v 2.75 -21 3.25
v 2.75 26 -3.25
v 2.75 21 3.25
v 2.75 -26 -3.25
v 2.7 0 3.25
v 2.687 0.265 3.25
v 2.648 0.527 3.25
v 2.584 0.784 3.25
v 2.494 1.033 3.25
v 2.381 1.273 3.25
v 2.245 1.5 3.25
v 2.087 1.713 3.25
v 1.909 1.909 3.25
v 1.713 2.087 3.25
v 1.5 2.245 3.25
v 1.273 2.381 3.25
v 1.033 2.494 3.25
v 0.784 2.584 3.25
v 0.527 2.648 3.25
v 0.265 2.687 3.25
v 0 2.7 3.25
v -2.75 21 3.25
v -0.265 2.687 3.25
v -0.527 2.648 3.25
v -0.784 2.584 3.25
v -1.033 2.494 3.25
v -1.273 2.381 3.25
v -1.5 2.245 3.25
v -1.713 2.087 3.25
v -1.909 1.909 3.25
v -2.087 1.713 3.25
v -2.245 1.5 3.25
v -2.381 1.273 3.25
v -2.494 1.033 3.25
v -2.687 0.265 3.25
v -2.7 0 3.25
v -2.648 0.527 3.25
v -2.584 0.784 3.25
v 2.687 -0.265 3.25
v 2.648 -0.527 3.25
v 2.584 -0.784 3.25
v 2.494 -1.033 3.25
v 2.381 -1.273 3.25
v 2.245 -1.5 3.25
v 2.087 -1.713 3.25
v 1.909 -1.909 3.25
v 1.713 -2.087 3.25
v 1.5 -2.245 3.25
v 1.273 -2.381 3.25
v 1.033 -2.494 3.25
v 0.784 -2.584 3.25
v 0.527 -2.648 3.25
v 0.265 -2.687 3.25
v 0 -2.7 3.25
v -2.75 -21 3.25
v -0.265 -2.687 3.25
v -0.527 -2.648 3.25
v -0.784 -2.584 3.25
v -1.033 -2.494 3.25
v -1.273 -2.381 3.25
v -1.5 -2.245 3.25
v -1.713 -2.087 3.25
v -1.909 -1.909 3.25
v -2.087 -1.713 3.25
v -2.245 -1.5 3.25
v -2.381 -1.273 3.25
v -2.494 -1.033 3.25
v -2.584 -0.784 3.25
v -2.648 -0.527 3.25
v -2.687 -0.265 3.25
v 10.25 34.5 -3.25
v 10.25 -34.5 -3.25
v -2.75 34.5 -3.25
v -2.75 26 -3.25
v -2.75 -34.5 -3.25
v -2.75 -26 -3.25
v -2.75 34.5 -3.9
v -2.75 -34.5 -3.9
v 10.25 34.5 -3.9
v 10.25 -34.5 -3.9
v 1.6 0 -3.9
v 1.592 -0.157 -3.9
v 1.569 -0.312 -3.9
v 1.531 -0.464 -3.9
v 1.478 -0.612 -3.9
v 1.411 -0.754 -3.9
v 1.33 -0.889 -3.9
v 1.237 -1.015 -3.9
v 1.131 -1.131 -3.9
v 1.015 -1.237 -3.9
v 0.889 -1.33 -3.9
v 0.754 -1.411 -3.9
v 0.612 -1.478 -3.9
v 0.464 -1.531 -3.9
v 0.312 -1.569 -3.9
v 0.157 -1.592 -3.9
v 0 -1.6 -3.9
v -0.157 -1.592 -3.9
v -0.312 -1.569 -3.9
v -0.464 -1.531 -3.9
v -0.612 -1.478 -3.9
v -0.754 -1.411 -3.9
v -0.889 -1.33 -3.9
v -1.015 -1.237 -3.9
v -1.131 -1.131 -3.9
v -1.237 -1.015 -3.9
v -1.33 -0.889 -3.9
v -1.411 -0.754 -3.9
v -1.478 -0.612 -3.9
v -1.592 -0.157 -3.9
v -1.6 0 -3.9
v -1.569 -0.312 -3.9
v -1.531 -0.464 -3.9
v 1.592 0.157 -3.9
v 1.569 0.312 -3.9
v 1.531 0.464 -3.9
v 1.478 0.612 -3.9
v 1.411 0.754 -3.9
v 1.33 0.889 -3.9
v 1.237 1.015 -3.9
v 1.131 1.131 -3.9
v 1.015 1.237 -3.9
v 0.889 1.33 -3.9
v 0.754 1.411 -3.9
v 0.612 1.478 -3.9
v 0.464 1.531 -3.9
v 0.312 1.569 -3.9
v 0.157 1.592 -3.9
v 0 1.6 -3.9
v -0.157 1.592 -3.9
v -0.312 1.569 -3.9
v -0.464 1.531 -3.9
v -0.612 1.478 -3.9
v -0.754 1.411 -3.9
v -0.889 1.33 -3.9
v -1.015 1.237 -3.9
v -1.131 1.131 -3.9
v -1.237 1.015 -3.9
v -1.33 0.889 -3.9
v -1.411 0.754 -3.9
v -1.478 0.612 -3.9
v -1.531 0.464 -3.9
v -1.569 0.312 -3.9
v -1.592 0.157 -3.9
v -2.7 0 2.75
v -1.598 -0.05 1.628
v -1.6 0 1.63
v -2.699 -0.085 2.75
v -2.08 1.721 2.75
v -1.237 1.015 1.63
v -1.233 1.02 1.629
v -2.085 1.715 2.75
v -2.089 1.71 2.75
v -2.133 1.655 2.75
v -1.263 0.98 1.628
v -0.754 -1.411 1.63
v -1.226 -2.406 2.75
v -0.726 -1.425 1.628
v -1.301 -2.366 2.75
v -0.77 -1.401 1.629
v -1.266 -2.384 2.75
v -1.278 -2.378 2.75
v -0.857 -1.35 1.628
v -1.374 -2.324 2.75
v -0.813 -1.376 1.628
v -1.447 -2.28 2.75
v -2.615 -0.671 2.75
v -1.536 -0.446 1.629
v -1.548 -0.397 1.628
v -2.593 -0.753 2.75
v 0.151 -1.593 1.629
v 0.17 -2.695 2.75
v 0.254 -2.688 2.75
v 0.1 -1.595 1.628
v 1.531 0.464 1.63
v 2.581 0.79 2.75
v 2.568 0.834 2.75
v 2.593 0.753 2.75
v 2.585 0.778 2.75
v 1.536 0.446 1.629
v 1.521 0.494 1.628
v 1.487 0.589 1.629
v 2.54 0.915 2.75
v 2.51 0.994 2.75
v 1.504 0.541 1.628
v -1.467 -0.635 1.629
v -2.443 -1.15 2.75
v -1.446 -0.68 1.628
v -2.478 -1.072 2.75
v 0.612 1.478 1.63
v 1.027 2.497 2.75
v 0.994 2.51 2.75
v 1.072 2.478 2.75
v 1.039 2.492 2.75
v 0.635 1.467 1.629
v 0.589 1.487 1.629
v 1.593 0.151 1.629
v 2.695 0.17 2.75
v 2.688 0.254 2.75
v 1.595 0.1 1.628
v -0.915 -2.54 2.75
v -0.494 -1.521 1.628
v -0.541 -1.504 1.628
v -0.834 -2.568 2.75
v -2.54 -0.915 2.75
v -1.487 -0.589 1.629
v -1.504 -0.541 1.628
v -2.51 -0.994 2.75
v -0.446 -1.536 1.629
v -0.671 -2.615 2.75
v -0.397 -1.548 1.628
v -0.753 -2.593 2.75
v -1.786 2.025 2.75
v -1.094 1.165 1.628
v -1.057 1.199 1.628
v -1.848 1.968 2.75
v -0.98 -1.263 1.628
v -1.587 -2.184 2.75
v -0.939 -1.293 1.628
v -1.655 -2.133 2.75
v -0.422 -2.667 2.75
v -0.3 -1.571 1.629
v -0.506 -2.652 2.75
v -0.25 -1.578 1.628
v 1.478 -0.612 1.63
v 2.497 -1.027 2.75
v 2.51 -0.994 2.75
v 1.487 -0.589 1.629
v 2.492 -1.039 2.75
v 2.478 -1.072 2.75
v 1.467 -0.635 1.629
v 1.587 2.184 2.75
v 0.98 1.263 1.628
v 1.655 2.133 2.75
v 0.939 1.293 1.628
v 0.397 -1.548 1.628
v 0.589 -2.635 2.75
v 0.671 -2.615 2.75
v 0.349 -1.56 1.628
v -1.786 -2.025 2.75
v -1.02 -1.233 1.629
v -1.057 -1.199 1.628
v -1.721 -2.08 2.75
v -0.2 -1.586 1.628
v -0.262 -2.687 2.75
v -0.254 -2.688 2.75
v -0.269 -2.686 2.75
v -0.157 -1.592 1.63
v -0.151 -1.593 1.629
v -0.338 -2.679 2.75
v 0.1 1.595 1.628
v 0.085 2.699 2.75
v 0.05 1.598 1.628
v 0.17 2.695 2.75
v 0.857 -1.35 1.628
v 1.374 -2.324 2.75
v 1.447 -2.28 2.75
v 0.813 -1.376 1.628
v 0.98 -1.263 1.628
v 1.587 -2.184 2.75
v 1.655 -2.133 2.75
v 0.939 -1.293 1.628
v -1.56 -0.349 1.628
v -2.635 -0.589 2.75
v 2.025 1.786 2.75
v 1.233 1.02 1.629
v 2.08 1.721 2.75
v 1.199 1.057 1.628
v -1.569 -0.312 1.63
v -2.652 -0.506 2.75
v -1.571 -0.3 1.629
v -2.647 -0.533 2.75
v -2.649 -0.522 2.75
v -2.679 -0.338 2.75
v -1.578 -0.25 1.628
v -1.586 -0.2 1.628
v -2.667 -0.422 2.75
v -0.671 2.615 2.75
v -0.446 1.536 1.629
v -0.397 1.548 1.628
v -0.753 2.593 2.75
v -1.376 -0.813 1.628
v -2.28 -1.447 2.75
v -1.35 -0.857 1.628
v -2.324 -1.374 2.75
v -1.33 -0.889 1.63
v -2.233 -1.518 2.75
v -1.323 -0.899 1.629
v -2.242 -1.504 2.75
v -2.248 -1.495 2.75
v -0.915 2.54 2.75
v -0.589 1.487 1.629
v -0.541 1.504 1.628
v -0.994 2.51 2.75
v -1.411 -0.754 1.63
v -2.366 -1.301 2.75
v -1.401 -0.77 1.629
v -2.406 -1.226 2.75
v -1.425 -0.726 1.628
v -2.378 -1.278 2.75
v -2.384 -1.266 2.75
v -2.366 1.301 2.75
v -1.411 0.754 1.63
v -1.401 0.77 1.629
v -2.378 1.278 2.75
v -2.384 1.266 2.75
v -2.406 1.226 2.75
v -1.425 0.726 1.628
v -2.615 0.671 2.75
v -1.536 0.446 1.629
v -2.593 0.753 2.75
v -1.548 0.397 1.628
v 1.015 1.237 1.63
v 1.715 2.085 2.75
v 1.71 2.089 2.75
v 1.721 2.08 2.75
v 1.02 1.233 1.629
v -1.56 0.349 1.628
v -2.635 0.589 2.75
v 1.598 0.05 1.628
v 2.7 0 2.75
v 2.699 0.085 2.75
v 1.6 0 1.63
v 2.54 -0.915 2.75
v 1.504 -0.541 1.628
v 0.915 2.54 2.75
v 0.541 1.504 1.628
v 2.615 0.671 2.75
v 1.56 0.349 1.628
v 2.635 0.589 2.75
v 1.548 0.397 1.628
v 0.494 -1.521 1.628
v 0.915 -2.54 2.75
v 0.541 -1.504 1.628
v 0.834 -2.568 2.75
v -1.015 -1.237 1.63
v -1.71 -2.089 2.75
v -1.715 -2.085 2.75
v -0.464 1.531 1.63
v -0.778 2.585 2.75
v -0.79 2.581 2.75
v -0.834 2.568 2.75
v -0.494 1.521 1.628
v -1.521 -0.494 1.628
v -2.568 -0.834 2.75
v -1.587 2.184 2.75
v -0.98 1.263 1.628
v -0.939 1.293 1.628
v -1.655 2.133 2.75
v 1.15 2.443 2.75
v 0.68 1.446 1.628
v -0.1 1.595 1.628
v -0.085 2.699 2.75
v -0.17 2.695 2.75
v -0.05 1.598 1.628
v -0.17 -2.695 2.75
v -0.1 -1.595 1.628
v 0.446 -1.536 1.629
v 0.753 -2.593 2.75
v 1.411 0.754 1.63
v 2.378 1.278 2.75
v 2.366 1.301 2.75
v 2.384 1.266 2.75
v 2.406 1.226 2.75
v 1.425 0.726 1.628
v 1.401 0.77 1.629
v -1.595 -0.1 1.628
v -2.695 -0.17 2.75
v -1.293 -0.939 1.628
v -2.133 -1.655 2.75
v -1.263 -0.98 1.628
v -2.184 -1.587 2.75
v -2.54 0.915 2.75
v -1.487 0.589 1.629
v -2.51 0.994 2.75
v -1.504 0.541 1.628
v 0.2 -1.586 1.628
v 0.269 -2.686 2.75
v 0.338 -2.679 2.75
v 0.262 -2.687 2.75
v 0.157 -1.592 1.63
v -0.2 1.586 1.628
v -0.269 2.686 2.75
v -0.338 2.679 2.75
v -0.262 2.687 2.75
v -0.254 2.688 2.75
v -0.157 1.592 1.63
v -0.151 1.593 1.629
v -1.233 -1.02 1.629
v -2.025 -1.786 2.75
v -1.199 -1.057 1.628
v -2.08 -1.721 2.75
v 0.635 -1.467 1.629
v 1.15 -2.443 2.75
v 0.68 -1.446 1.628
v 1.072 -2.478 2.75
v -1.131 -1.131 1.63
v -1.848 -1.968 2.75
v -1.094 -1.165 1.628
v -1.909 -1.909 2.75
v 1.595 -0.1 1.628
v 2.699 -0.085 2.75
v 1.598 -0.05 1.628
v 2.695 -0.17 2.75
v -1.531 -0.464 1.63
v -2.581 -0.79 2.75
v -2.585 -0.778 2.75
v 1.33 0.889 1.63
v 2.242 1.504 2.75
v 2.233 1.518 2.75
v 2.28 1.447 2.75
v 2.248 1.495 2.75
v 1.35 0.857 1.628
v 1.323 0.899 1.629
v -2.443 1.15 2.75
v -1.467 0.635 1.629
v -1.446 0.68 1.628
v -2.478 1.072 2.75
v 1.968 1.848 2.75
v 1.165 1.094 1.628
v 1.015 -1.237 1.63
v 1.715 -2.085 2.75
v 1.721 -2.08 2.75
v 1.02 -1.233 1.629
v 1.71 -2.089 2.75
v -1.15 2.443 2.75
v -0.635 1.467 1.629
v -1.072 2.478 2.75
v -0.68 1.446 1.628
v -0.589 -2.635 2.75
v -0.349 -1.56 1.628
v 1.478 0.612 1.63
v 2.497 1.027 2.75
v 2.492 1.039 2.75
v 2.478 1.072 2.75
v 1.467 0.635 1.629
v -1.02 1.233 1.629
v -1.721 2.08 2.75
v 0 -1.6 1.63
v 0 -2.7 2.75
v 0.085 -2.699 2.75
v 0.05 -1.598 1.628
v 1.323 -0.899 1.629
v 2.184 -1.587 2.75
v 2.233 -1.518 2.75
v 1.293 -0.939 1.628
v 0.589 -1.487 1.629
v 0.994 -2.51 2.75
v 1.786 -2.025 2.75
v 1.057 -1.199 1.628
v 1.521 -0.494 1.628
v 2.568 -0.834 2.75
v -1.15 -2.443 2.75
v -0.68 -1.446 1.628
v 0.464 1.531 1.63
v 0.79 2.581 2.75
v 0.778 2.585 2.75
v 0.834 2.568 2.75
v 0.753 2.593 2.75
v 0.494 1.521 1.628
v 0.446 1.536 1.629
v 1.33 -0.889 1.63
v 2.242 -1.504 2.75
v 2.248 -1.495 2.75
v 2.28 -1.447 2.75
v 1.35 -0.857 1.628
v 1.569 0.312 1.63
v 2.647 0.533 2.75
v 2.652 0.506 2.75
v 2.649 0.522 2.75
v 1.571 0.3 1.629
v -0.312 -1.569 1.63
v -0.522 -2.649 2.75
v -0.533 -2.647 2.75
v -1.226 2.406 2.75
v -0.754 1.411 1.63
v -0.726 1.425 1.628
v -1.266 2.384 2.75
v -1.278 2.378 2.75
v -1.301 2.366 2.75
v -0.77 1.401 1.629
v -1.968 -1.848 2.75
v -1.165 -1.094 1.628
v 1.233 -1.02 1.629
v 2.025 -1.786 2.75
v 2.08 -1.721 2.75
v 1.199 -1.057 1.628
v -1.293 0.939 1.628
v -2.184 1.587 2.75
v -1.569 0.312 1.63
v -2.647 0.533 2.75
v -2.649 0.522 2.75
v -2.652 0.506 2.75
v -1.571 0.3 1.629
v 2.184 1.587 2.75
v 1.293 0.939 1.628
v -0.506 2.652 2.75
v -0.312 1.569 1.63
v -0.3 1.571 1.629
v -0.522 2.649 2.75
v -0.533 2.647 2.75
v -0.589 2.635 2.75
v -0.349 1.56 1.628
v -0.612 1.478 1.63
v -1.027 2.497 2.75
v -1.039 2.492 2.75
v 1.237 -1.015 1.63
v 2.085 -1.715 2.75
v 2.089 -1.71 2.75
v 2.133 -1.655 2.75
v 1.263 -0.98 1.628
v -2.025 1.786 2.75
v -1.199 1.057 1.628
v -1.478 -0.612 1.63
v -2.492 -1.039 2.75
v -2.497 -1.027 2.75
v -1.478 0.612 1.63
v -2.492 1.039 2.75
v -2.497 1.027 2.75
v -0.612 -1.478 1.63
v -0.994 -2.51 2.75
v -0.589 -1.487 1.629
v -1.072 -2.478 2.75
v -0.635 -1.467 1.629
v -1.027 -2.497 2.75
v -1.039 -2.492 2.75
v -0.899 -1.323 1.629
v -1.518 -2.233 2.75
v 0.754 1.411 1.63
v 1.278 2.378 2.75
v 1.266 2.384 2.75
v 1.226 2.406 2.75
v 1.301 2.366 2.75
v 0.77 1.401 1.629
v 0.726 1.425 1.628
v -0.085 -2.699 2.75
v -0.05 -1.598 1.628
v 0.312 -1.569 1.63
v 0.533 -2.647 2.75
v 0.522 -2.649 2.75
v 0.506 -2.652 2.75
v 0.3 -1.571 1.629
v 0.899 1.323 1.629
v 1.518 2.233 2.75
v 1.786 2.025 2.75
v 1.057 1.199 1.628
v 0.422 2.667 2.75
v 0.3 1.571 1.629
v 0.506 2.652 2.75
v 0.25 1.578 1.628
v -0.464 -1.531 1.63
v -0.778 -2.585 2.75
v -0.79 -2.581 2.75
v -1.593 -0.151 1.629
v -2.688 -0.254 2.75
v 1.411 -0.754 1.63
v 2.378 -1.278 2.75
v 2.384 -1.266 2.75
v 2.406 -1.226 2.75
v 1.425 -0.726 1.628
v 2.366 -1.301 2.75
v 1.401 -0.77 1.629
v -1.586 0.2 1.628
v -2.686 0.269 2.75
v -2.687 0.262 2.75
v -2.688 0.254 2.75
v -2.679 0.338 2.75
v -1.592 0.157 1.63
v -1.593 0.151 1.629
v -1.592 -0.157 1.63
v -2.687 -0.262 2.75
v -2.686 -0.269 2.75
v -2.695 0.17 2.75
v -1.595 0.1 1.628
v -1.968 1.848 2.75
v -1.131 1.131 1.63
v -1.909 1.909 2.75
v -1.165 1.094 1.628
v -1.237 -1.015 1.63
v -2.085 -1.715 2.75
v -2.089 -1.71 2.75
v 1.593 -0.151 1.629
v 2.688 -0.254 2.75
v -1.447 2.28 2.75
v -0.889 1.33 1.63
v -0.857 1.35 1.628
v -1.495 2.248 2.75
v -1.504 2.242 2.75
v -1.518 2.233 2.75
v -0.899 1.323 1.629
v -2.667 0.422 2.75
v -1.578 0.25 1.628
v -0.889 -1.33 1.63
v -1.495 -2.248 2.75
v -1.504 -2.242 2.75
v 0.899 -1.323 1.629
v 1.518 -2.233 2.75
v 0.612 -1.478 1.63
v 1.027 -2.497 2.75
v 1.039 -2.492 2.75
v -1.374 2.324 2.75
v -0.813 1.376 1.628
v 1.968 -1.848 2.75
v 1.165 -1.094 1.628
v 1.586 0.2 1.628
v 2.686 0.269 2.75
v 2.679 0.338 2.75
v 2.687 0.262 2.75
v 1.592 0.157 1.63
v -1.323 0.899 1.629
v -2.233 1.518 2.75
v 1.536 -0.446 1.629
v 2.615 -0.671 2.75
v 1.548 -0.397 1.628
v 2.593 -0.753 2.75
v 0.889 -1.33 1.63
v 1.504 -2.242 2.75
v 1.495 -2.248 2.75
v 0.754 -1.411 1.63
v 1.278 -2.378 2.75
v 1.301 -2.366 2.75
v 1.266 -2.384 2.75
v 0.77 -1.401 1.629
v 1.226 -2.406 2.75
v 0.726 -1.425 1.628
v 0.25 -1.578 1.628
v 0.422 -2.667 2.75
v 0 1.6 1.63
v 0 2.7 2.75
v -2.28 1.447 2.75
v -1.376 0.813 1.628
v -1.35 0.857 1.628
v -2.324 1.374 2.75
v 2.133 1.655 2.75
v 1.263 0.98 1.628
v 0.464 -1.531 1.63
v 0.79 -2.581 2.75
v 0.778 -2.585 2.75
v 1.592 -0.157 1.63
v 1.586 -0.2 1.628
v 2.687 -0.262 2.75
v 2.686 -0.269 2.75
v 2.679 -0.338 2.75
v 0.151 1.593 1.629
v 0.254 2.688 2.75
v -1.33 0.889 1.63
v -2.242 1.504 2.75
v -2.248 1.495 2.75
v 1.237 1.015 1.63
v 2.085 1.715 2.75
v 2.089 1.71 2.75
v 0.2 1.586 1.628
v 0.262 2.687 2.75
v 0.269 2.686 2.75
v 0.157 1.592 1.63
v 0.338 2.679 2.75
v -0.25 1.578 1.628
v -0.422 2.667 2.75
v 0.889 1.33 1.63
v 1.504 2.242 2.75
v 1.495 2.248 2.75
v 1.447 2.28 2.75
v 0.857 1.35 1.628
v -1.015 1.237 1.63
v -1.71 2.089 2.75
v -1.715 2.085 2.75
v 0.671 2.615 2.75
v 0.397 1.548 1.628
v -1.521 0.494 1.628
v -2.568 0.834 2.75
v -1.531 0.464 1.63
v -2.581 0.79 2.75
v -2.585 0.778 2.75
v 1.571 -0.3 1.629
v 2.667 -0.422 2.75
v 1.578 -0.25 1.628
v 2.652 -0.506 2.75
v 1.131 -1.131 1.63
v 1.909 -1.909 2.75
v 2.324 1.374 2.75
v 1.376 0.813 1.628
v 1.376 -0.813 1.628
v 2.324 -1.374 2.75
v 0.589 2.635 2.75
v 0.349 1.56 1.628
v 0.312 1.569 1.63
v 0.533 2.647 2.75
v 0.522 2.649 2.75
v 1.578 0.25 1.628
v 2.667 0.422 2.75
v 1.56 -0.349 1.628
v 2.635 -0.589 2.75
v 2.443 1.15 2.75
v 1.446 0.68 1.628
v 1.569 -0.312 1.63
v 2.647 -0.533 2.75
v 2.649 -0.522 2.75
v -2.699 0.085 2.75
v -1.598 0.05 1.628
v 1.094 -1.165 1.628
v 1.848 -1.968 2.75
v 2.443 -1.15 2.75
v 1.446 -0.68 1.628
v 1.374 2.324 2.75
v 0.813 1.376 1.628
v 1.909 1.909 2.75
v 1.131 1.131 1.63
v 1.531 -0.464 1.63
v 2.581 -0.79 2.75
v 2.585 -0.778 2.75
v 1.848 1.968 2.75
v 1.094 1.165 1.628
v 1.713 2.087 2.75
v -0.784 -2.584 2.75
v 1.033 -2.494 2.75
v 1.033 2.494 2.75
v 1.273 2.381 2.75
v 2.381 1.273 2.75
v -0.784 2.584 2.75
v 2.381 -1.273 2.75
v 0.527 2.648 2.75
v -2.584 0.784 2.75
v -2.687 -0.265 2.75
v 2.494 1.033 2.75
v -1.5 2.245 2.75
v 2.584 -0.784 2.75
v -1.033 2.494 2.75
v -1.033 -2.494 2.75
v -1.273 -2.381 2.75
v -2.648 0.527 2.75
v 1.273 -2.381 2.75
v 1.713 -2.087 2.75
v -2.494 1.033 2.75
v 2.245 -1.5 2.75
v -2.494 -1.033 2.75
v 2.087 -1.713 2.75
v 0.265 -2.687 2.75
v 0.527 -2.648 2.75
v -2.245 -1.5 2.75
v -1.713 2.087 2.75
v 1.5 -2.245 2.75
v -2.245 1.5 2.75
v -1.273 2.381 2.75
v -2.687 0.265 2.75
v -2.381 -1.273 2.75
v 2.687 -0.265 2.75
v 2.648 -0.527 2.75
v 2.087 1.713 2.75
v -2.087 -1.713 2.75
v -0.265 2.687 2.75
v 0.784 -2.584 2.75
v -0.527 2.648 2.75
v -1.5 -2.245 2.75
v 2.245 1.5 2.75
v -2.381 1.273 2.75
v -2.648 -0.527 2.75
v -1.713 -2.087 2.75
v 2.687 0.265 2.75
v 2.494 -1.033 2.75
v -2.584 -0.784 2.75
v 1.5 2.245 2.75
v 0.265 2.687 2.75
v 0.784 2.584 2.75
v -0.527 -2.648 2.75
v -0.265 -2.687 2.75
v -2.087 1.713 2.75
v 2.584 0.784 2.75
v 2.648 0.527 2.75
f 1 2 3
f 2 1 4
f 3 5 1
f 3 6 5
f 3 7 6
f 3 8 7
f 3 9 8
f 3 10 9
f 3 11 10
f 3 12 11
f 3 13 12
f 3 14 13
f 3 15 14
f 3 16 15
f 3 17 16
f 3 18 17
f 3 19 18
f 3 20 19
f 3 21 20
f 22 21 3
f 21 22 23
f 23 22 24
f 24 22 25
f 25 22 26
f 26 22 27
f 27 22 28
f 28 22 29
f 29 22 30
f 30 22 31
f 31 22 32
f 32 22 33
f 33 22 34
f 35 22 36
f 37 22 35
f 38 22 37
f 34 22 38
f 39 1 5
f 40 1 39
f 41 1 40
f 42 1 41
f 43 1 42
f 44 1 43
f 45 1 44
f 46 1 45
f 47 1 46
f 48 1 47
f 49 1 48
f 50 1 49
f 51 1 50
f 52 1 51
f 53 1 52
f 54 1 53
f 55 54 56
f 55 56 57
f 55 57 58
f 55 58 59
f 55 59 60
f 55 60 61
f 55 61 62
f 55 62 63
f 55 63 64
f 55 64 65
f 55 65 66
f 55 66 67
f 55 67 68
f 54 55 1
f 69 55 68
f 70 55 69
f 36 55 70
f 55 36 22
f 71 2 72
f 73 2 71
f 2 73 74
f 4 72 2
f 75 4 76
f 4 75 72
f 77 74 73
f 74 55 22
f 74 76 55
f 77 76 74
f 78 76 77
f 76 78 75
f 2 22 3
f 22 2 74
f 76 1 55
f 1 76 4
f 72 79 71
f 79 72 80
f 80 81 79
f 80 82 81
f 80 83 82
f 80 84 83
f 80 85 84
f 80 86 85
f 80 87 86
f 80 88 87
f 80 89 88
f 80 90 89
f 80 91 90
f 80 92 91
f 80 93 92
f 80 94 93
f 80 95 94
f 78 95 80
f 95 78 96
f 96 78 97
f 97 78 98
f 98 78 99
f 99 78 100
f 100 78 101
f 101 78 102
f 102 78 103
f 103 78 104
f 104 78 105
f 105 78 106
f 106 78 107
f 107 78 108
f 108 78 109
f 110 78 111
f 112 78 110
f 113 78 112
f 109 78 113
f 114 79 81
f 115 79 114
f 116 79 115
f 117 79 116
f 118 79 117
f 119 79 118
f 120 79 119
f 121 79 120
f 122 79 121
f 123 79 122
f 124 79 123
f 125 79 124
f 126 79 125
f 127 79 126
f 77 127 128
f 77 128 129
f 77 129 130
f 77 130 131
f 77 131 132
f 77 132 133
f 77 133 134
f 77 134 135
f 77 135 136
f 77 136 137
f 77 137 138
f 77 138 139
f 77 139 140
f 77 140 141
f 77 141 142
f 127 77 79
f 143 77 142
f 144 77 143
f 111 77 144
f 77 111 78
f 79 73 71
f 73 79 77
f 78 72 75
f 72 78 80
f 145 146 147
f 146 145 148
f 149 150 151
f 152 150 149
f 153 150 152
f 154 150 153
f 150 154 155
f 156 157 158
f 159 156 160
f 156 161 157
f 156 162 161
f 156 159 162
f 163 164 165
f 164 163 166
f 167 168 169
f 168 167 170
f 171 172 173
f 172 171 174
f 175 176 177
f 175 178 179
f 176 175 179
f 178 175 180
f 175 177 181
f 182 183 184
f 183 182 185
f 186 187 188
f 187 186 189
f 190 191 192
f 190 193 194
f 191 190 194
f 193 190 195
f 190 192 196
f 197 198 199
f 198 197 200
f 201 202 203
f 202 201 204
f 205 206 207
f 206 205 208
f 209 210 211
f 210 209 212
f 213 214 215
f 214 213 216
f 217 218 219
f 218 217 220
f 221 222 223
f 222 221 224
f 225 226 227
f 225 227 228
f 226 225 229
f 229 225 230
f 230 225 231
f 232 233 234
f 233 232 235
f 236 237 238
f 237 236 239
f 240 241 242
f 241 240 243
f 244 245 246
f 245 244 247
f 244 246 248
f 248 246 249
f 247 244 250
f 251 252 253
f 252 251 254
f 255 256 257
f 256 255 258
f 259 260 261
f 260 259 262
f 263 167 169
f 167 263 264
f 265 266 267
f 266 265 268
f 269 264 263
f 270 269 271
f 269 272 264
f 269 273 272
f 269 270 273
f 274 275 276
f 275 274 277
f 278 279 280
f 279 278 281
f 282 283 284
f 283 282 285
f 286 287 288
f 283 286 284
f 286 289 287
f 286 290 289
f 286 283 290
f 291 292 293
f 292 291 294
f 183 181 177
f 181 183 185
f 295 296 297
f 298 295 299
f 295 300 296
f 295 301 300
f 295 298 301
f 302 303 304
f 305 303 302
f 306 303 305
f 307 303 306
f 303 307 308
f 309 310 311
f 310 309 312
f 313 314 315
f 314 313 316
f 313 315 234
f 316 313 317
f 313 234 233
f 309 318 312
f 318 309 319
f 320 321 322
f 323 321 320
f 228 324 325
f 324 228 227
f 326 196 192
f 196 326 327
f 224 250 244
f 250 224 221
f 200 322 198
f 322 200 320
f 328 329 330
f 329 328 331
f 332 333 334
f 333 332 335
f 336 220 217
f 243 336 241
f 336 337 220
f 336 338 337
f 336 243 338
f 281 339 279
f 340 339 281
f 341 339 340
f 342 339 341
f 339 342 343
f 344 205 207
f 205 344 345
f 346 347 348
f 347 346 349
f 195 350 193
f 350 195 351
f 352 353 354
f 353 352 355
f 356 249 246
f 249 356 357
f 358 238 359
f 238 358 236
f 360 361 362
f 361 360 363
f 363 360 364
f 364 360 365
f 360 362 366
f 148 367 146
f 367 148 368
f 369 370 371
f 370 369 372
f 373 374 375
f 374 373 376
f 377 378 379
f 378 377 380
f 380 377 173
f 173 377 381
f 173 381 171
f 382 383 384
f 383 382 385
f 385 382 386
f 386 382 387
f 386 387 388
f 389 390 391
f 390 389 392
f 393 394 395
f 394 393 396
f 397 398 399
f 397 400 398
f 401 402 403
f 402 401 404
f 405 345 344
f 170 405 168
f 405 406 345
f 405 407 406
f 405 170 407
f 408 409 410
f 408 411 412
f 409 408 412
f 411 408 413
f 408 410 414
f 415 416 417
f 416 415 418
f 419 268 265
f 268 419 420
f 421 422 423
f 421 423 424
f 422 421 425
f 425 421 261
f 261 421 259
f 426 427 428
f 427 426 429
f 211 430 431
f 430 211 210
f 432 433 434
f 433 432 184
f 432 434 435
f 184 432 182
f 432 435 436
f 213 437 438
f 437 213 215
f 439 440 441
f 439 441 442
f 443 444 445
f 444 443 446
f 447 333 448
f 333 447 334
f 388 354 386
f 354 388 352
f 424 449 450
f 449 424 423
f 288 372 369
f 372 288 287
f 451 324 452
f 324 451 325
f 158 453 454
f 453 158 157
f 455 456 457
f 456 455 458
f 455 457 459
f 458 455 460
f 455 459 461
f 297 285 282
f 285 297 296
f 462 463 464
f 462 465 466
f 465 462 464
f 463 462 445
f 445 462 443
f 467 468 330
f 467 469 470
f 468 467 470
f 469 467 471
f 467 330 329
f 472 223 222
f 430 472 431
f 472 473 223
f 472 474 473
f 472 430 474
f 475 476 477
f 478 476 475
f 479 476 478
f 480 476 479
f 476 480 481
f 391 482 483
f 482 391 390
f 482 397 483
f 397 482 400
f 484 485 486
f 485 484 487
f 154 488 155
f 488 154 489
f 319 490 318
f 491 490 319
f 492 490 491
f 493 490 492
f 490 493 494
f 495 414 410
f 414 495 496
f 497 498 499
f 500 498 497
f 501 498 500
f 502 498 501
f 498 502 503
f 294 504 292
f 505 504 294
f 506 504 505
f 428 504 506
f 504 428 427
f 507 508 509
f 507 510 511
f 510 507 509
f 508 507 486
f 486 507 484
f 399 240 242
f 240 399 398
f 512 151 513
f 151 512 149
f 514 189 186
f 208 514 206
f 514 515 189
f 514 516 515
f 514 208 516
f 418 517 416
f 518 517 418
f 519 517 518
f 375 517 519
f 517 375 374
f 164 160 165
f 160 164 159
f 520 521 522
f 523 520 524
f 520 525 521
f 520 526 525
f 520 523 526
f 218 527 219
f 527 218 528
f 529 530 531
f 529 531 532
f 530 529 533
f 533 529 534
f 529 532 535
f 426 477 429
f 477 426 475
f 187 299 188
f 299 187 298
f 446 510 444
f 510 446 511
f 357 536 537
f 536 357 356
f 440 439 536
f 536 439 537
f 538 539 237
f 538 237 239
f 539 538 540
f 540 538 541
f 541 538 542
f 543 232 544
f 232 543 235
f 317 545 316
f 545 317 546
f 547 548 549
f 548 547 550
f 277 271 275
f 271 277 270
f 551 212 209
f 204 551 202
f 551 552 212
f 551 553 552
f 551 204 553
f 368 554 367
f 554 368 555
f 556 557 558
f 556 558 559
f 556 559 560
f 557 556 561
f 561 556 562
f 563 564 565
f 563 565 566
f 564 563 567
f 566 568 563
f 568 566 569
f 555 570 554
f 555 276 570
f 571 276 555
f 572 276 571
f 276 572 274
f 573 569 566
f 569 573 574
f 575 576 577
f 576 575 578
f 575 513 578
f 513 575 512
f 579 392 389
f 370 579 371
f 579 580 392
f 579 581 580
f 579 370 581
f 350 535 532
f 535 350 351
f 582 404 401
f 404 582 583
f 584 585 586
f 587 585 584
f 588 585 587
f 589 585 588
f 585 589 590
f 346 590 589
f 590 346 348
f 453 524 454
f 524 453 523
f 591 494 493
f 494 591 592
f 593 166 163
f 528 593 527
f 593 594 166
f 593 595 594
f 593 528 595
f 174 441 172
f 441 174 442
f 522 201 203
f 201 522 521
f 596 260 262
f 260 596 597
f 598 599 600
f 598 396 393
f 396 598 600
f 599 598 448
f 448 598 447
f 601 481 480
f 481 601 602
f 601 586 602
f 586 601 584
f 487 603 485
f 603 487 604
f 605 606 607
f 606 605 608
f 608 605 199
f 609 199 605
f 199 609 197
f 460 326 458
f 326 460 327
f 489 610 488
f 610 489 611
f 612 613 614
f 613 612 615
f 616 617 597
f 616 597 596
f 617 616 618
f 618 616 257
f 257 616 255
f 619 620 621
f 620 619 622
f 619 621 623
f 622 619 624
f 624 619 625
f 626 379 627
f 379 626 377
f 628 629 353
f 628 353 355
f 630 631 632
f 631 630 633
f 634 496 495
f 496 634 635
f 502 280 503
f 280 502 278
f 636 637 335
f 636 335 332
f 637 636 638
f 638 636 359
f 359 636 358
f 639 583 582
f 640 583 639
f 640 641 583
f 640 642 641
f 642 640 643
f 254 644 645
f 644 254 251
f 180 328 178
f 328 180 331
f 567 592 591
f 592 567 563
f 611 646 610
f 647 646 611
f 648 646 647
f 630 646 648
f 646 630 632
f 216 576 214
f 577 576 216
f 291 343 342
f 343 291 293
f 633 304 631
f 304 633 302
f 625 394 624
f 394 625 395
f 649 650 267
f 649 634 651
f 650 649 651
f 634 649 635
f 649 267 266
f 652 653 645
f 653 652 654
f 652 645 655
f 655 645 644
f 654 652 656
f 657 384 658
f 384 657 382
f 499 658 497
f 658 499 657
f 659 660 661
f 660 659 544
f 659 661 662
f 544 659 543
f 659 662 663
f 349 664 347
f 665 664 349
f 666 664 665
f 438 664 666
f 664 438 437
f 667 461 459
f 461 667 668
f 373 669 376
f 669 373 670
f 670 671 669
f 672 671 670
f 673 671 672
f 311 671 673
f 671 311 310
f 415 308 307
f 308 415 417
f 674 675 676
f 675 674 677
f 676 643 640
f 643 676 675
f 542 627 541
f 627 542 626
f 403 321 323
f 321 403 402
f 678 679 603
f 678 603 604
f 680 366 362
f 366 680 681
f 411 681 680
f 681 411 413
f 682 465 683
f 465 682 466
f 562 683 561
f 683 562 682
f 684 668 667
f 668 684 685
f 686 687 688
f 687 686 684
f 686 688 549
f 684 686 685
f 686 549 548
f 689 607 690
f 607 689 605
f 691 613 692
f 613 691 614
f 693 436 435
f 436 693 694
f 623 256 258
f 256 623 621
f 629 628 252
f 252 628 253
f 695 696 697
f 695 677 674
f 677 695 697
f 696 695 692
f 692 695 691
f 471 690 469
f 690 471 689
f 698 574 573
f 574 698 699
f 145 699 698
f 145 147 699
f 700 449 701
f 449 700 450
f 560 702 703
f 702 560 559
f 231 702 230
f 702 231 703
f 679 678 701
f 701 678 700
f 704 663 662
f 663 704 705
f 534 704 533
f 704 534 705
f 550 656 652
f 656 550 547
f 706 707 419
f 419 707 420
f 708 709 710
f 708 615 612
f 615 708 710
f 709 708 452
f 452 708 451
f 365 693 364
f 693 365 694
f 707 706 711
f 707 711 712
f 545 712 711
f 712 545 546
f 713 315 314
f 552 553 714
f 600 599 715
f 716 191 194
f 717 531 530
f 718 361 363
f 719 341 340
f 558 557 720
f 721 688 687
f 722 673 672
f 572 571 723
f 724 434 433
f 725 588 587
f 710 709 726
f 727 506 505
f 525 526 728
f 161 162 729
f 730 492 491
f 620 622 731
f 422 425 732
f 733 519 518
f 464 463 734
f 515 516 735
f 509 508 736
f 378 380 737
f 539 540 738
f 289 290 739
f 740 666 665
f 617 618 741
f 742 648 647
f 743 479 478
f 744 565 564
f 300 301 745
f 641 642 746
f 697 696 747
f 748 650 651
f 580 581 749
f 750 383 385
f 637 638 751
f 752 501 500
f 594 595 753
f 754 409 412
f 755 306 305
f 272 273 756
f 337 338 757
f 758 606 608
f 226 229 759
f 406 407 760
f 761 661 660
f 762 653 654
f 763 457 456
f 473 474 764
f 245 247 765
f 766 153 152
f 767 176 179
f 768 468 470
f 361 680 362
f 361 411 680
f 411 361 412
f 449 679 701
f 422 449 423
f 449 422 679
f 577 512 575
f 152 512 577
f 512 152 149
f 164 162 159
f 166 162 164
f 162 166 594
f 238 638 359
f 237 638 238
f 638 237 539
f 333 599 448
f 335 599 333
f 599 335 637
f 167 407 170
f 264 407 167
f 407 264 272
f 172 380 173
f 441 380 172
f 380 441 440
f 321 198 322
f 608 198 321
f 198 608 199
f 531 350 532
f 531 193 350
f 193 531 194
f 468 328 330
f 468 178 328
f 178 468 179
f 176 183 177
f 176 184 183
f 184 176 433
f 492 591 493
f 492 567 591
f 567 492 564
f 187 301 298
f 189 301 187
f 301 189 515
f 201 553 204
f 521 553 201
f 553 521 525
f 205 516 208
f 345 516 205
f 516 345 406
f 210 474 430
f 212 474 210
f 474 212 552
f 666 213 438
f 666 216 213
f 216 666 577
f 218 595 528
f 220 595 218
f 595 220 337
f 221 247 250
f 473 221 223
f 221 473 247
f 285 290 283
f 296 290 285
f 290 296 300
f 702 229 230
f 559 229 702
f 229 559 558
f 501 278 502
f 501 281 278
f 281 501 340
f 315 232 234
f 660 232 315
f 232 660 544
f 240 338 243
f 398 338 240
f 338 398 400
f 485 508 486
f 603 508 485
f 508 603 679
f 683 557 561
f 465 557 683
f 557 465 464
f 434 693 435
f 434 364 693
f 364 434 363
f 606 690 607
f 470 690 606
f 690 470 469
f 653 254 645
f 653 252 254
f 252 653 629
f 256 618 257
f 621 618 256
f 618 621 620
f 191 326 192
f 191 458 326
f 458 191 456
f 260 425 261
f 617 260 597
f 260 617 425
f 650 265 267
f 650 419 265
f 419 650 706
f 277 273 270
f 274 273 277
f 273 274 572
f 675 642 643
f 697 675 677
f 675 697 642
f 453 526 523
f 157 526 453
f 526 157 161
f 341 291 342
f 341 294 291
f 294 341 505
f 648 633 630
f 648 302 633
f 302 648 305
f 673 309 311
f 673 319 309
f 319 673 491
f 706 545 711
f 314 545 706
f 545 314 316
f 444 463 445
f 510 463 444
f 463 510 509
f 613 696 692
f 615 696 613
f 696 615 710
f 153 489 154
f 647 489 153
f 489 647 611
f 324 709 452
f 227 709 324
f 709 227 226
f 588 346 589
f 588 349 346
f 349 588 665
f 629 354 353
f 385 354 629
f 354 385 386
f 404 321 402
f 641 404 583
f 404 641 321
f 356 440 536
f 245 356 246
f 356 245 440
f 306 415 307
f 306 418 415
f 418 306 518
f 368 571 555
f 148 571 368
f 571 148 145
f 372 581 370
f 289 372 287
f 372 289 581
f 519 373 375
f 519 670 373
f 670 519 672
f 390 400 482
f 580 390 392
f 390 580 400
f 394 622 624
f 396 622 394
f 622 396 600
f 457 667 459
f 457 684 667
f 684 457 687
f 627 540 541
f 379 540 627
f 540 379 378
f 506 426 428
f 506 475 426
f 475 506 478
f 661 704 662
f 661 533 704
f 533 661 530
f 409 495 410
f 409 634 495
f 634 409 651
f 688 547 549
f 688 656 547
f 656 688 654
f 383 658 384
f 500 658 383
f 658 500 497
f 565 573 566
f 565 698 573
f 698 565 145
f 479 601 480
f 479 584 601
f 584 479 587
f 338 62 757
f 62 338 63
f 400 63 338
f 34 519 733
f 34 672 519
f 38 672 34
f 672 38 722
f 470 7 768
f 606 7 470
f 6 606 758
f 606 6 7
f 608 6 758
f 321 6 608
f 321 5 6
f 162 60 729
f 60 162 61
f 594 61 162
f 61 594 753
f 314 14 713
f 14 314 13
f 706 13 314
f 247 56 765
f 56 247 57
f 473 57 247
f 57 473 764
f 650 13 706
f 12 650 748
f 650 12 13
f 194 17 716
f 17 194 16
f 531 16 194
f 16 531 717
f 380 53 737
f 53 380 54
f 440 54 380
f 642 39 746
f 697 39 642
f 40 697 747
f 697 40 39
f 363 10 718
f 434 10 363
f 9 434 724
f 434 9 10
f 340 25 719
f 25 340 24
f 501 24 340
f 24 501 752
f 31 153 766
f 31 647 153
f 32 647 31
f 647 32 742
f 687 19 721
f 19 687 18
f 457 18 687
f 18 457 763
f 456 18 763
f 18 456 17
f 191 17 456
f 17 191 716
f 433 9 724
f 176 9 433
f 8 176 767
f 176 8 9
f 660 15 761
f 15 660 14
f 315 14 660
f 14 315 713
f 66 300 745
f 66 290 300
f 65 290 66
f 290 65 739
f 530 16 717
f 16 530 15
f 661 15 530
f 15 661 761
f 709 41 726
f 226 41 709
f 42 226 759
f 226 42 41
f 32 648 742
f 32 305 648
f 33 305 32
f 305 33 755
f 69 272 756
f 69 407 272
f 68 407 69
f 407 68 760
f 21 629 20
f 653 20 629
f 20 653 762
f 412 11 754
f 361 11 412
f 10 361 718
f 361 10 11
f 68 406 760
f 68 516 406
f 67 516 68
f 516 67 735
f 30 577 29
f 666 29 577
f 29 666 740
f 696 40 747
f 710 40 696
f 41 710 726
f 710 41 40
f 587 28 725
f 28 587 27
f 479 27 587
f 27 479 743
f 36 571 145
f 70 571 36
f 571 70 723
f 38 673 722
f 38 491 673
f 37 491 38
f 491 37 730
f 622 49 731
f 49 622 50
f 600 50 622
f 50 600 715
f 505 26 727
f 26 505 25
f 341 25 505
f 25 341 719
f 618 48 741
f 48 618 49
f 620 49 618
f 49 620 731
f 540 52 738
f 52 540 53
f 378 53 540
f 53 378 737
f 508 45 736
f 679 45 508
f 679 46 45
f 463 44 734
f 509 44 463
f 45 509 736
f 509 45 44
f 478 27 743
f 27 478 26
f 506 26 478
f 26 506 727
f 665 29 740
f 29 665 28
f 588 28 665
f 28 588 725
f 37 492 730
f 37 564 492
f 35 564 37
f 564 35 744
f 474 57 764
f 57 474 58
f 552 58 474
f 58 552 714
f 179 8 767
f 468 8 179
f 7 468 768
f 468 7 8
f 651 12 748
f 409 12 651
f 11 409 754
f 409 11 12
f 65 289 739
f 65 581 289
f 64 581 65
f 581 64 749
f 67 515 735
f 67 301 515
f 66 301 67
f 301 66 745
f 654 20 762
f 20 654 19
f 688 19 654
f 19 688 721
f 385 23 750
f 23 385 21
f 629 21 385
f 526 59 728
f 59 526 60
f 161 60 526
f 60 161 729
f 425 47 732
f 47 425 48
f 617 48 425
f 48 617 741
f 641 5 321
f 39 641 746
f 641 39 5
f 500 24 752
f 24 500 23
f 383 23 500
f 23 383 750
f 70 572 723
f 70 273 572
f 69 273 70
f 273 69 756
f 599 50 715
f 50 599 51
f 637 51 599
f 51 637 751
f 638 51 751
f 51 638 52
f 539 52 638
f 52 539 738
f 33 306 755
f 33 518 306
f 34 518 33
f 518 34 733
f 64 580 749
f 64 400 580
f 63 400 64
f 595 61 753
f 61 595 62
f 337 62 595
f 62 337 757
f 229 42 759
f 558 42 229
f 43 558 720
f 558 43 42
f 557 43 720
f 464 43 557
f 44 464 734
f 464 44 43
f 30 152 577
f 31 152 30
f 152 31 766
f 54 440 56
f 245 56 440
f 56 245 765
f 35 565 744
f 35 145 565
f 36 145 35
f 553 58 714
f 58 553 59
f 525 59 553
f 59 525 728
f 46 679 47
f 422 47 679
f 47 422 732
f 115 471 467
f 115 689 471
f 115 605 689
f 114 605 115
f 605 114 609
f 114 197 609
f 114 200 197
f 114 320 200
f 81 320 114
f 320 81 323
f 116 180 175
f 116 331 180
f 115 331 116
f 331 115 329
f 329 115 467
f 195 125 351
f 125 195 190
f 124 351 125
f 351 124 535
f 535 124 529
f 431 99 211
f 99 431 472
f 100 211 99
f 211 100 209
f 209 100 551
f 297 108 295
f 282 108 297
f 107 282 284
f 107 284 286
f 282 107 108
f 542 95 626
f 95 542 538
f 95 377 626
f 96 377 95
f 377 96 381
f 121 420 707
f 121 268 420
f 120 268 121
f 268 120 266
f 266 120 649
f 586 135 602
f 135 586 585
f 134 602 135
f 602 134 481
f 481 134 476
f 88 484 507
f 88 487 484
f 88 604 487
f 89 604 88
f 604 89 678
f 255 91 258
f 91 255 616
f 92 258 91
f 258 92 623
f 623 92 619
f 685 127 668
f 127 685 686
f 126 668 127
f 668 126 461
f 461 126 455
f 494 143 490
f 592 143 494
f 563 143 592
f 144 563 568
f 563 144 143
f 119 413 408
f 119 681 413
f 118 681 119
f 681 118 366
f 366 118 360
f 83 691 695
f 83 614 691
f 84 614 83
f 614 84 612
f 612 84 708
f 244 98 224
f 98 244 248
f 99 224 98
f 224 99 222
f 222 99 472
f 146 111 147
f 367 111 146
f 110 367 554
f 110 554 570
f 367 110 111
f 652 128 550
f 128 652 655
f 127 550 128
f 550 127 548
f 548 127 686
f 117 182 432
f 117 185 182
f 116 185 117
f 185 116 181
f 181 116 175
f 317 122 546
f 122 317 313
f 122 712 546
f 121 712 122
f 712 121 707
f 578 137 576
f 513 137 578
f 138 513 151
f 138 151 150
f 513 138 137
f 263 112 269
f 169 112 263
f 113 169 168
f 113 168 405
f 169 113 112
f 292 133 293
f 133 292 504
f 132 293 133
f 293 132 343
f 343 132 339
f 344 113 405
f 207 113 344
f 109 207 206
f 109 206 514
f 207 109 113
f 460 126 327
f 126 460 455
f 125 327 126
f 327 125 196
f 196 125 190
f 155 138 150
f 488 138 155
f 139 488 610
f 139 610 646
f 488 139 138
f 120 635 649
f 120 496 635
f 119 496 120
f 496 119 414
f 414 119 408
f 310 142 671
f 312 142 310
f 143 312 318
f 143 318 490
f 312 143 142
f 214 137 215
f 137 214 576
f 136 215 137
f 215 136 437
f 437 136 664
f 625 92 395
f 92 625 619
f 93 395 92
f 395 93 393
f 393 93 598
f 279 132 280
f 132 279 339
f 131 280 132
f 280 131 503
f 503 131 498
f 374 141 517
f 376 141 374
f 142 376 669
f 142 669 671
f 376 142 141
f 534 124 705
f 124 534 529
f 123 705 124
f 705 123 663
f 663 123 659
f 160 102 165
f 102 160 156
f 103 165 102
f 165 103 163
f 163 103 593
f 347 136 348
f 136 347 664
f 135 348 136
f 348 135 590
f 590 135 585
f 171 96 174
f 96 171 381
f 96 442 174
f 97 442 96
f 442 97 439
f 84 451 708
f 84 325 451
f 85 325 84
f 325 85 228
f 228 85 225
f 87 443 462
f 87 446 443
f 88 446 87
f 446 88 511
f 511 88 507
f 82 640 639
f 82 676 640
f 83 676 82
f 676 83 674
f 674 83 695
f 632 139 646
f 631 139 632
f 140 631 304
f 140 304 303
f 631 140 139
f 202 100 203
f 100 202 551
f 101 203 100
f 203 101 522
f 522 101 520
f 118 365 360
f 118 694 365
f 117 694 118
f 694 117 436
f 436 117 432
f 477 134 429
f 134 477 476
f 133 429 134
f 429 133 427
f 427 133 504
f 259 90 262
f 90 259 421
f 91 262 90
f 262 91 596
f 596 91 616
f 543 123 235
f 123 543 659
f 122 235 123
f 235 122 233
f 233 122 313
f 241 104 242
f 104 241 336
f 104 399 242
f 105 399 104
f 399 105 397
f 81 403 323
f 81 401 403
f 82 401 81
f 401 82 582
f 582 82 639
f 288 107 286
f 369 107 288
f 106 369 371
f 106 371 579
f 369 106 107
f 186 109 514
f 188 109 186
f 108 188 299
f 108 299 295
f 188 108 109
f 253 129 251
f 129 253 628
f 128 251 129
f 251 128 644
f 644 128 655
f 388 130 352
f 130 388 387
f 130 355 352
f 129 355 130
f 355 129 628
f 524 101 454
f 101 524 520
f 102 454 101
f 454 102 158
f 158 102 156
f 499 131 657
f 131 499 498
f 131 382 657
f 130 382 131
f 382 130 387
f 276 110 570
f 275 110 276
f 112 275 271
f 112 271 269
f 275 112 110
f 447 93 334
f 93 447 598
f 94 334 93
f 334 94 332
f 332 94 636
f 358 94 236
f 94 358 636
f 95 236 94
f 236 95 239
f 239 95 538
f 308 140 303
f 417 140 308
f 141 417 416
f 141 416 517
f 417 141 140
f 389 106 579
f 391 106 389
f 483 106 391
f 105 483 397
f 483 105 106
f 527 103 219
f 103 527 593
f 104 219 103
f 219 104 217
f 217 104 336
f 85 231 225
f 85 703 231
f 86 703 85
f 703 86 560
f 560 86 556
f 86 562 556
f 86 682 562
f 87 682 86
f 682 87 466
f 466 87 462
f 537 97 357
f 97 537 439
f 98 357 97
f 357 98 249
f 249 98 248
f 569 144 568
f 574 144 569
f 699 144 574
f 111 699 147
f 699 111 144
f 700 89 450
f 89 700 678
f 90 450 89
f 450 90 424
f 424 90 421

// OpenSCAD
ridge_width=5.5;
valley_width=7.5;
ridge_height=6.5;
ridge_top_length=42;
ridge_full_length=52;
plate_height = 0.65;
plate_length=69;
screwhead_radius=2.7;

tolerance=0.2;

module countersink()
{
  
  //assume a 90 degree angle. For US inch screws it is probably 82 degrees
  radius=screwhead_radius;
  depth=2.75;
  rotate_extrude($fn=200)
  polygon(points=[[0,0],[radius,0],[0,depth]], paths=[[0,1,2]]);
}

module ridge()
{
  cube([ridge_width,42,ridge_height],center=true);
  translate([0,21,0])slope();
  translate([0,-21,0])rotate([0,0,180])slope();
}


module slope()
{
  length=(ridge_full_length-ridge_top_length)/2;
  translate([-ridge_width/2,0,-ridge_height/2])rotate([90,0,90])
    linear_extrude(height=ridge_width)
        {
            polygon(points=[[0,0],[length,0],[0,ridge_height]], paths=[[0,1,2]]);
        }
}

module strip(ridges=2)
{
  //ridges
  for (step = [0:ridges-1])
  {
    ridge_x_pos = step*(ridge_width+valley_width);
    translate([ridge_x_pos,0,0]) ridge();
  }
  //baseplate
  plate_width = ridges*(ridge_width+valley_width);
  translate([-ridge_width/2,-plate_length/2,-ridge_height/2-plate_height])cube([plate_width,plate_length,plate_height]);
}

module screwstrip(ridges=2)
{
  difference()
  {
    strip(ridges);
    for (step = [0:ridges-1])
    {
      if ((step % 5) == 0)
      {
        ridge_x_pos = step*(ridge_width+valley_width);
        translate([ridge_x_pos,0,ridge_height/2-0.5]) rotate([180,0,0])countersink();
        translate([ridge_x_pos,0,ridge_height/2]) cylinder(r=screwhead_radius,h=1,center=true,$fn=64);
        translate([ridge_x_pos,0,ridge_height/2]) cylinder(r=1.6,h=100,center=true,$fn=64);
      }
     }
    
  }
}

// 16 is probably max length for printing
screwstrip(1);
